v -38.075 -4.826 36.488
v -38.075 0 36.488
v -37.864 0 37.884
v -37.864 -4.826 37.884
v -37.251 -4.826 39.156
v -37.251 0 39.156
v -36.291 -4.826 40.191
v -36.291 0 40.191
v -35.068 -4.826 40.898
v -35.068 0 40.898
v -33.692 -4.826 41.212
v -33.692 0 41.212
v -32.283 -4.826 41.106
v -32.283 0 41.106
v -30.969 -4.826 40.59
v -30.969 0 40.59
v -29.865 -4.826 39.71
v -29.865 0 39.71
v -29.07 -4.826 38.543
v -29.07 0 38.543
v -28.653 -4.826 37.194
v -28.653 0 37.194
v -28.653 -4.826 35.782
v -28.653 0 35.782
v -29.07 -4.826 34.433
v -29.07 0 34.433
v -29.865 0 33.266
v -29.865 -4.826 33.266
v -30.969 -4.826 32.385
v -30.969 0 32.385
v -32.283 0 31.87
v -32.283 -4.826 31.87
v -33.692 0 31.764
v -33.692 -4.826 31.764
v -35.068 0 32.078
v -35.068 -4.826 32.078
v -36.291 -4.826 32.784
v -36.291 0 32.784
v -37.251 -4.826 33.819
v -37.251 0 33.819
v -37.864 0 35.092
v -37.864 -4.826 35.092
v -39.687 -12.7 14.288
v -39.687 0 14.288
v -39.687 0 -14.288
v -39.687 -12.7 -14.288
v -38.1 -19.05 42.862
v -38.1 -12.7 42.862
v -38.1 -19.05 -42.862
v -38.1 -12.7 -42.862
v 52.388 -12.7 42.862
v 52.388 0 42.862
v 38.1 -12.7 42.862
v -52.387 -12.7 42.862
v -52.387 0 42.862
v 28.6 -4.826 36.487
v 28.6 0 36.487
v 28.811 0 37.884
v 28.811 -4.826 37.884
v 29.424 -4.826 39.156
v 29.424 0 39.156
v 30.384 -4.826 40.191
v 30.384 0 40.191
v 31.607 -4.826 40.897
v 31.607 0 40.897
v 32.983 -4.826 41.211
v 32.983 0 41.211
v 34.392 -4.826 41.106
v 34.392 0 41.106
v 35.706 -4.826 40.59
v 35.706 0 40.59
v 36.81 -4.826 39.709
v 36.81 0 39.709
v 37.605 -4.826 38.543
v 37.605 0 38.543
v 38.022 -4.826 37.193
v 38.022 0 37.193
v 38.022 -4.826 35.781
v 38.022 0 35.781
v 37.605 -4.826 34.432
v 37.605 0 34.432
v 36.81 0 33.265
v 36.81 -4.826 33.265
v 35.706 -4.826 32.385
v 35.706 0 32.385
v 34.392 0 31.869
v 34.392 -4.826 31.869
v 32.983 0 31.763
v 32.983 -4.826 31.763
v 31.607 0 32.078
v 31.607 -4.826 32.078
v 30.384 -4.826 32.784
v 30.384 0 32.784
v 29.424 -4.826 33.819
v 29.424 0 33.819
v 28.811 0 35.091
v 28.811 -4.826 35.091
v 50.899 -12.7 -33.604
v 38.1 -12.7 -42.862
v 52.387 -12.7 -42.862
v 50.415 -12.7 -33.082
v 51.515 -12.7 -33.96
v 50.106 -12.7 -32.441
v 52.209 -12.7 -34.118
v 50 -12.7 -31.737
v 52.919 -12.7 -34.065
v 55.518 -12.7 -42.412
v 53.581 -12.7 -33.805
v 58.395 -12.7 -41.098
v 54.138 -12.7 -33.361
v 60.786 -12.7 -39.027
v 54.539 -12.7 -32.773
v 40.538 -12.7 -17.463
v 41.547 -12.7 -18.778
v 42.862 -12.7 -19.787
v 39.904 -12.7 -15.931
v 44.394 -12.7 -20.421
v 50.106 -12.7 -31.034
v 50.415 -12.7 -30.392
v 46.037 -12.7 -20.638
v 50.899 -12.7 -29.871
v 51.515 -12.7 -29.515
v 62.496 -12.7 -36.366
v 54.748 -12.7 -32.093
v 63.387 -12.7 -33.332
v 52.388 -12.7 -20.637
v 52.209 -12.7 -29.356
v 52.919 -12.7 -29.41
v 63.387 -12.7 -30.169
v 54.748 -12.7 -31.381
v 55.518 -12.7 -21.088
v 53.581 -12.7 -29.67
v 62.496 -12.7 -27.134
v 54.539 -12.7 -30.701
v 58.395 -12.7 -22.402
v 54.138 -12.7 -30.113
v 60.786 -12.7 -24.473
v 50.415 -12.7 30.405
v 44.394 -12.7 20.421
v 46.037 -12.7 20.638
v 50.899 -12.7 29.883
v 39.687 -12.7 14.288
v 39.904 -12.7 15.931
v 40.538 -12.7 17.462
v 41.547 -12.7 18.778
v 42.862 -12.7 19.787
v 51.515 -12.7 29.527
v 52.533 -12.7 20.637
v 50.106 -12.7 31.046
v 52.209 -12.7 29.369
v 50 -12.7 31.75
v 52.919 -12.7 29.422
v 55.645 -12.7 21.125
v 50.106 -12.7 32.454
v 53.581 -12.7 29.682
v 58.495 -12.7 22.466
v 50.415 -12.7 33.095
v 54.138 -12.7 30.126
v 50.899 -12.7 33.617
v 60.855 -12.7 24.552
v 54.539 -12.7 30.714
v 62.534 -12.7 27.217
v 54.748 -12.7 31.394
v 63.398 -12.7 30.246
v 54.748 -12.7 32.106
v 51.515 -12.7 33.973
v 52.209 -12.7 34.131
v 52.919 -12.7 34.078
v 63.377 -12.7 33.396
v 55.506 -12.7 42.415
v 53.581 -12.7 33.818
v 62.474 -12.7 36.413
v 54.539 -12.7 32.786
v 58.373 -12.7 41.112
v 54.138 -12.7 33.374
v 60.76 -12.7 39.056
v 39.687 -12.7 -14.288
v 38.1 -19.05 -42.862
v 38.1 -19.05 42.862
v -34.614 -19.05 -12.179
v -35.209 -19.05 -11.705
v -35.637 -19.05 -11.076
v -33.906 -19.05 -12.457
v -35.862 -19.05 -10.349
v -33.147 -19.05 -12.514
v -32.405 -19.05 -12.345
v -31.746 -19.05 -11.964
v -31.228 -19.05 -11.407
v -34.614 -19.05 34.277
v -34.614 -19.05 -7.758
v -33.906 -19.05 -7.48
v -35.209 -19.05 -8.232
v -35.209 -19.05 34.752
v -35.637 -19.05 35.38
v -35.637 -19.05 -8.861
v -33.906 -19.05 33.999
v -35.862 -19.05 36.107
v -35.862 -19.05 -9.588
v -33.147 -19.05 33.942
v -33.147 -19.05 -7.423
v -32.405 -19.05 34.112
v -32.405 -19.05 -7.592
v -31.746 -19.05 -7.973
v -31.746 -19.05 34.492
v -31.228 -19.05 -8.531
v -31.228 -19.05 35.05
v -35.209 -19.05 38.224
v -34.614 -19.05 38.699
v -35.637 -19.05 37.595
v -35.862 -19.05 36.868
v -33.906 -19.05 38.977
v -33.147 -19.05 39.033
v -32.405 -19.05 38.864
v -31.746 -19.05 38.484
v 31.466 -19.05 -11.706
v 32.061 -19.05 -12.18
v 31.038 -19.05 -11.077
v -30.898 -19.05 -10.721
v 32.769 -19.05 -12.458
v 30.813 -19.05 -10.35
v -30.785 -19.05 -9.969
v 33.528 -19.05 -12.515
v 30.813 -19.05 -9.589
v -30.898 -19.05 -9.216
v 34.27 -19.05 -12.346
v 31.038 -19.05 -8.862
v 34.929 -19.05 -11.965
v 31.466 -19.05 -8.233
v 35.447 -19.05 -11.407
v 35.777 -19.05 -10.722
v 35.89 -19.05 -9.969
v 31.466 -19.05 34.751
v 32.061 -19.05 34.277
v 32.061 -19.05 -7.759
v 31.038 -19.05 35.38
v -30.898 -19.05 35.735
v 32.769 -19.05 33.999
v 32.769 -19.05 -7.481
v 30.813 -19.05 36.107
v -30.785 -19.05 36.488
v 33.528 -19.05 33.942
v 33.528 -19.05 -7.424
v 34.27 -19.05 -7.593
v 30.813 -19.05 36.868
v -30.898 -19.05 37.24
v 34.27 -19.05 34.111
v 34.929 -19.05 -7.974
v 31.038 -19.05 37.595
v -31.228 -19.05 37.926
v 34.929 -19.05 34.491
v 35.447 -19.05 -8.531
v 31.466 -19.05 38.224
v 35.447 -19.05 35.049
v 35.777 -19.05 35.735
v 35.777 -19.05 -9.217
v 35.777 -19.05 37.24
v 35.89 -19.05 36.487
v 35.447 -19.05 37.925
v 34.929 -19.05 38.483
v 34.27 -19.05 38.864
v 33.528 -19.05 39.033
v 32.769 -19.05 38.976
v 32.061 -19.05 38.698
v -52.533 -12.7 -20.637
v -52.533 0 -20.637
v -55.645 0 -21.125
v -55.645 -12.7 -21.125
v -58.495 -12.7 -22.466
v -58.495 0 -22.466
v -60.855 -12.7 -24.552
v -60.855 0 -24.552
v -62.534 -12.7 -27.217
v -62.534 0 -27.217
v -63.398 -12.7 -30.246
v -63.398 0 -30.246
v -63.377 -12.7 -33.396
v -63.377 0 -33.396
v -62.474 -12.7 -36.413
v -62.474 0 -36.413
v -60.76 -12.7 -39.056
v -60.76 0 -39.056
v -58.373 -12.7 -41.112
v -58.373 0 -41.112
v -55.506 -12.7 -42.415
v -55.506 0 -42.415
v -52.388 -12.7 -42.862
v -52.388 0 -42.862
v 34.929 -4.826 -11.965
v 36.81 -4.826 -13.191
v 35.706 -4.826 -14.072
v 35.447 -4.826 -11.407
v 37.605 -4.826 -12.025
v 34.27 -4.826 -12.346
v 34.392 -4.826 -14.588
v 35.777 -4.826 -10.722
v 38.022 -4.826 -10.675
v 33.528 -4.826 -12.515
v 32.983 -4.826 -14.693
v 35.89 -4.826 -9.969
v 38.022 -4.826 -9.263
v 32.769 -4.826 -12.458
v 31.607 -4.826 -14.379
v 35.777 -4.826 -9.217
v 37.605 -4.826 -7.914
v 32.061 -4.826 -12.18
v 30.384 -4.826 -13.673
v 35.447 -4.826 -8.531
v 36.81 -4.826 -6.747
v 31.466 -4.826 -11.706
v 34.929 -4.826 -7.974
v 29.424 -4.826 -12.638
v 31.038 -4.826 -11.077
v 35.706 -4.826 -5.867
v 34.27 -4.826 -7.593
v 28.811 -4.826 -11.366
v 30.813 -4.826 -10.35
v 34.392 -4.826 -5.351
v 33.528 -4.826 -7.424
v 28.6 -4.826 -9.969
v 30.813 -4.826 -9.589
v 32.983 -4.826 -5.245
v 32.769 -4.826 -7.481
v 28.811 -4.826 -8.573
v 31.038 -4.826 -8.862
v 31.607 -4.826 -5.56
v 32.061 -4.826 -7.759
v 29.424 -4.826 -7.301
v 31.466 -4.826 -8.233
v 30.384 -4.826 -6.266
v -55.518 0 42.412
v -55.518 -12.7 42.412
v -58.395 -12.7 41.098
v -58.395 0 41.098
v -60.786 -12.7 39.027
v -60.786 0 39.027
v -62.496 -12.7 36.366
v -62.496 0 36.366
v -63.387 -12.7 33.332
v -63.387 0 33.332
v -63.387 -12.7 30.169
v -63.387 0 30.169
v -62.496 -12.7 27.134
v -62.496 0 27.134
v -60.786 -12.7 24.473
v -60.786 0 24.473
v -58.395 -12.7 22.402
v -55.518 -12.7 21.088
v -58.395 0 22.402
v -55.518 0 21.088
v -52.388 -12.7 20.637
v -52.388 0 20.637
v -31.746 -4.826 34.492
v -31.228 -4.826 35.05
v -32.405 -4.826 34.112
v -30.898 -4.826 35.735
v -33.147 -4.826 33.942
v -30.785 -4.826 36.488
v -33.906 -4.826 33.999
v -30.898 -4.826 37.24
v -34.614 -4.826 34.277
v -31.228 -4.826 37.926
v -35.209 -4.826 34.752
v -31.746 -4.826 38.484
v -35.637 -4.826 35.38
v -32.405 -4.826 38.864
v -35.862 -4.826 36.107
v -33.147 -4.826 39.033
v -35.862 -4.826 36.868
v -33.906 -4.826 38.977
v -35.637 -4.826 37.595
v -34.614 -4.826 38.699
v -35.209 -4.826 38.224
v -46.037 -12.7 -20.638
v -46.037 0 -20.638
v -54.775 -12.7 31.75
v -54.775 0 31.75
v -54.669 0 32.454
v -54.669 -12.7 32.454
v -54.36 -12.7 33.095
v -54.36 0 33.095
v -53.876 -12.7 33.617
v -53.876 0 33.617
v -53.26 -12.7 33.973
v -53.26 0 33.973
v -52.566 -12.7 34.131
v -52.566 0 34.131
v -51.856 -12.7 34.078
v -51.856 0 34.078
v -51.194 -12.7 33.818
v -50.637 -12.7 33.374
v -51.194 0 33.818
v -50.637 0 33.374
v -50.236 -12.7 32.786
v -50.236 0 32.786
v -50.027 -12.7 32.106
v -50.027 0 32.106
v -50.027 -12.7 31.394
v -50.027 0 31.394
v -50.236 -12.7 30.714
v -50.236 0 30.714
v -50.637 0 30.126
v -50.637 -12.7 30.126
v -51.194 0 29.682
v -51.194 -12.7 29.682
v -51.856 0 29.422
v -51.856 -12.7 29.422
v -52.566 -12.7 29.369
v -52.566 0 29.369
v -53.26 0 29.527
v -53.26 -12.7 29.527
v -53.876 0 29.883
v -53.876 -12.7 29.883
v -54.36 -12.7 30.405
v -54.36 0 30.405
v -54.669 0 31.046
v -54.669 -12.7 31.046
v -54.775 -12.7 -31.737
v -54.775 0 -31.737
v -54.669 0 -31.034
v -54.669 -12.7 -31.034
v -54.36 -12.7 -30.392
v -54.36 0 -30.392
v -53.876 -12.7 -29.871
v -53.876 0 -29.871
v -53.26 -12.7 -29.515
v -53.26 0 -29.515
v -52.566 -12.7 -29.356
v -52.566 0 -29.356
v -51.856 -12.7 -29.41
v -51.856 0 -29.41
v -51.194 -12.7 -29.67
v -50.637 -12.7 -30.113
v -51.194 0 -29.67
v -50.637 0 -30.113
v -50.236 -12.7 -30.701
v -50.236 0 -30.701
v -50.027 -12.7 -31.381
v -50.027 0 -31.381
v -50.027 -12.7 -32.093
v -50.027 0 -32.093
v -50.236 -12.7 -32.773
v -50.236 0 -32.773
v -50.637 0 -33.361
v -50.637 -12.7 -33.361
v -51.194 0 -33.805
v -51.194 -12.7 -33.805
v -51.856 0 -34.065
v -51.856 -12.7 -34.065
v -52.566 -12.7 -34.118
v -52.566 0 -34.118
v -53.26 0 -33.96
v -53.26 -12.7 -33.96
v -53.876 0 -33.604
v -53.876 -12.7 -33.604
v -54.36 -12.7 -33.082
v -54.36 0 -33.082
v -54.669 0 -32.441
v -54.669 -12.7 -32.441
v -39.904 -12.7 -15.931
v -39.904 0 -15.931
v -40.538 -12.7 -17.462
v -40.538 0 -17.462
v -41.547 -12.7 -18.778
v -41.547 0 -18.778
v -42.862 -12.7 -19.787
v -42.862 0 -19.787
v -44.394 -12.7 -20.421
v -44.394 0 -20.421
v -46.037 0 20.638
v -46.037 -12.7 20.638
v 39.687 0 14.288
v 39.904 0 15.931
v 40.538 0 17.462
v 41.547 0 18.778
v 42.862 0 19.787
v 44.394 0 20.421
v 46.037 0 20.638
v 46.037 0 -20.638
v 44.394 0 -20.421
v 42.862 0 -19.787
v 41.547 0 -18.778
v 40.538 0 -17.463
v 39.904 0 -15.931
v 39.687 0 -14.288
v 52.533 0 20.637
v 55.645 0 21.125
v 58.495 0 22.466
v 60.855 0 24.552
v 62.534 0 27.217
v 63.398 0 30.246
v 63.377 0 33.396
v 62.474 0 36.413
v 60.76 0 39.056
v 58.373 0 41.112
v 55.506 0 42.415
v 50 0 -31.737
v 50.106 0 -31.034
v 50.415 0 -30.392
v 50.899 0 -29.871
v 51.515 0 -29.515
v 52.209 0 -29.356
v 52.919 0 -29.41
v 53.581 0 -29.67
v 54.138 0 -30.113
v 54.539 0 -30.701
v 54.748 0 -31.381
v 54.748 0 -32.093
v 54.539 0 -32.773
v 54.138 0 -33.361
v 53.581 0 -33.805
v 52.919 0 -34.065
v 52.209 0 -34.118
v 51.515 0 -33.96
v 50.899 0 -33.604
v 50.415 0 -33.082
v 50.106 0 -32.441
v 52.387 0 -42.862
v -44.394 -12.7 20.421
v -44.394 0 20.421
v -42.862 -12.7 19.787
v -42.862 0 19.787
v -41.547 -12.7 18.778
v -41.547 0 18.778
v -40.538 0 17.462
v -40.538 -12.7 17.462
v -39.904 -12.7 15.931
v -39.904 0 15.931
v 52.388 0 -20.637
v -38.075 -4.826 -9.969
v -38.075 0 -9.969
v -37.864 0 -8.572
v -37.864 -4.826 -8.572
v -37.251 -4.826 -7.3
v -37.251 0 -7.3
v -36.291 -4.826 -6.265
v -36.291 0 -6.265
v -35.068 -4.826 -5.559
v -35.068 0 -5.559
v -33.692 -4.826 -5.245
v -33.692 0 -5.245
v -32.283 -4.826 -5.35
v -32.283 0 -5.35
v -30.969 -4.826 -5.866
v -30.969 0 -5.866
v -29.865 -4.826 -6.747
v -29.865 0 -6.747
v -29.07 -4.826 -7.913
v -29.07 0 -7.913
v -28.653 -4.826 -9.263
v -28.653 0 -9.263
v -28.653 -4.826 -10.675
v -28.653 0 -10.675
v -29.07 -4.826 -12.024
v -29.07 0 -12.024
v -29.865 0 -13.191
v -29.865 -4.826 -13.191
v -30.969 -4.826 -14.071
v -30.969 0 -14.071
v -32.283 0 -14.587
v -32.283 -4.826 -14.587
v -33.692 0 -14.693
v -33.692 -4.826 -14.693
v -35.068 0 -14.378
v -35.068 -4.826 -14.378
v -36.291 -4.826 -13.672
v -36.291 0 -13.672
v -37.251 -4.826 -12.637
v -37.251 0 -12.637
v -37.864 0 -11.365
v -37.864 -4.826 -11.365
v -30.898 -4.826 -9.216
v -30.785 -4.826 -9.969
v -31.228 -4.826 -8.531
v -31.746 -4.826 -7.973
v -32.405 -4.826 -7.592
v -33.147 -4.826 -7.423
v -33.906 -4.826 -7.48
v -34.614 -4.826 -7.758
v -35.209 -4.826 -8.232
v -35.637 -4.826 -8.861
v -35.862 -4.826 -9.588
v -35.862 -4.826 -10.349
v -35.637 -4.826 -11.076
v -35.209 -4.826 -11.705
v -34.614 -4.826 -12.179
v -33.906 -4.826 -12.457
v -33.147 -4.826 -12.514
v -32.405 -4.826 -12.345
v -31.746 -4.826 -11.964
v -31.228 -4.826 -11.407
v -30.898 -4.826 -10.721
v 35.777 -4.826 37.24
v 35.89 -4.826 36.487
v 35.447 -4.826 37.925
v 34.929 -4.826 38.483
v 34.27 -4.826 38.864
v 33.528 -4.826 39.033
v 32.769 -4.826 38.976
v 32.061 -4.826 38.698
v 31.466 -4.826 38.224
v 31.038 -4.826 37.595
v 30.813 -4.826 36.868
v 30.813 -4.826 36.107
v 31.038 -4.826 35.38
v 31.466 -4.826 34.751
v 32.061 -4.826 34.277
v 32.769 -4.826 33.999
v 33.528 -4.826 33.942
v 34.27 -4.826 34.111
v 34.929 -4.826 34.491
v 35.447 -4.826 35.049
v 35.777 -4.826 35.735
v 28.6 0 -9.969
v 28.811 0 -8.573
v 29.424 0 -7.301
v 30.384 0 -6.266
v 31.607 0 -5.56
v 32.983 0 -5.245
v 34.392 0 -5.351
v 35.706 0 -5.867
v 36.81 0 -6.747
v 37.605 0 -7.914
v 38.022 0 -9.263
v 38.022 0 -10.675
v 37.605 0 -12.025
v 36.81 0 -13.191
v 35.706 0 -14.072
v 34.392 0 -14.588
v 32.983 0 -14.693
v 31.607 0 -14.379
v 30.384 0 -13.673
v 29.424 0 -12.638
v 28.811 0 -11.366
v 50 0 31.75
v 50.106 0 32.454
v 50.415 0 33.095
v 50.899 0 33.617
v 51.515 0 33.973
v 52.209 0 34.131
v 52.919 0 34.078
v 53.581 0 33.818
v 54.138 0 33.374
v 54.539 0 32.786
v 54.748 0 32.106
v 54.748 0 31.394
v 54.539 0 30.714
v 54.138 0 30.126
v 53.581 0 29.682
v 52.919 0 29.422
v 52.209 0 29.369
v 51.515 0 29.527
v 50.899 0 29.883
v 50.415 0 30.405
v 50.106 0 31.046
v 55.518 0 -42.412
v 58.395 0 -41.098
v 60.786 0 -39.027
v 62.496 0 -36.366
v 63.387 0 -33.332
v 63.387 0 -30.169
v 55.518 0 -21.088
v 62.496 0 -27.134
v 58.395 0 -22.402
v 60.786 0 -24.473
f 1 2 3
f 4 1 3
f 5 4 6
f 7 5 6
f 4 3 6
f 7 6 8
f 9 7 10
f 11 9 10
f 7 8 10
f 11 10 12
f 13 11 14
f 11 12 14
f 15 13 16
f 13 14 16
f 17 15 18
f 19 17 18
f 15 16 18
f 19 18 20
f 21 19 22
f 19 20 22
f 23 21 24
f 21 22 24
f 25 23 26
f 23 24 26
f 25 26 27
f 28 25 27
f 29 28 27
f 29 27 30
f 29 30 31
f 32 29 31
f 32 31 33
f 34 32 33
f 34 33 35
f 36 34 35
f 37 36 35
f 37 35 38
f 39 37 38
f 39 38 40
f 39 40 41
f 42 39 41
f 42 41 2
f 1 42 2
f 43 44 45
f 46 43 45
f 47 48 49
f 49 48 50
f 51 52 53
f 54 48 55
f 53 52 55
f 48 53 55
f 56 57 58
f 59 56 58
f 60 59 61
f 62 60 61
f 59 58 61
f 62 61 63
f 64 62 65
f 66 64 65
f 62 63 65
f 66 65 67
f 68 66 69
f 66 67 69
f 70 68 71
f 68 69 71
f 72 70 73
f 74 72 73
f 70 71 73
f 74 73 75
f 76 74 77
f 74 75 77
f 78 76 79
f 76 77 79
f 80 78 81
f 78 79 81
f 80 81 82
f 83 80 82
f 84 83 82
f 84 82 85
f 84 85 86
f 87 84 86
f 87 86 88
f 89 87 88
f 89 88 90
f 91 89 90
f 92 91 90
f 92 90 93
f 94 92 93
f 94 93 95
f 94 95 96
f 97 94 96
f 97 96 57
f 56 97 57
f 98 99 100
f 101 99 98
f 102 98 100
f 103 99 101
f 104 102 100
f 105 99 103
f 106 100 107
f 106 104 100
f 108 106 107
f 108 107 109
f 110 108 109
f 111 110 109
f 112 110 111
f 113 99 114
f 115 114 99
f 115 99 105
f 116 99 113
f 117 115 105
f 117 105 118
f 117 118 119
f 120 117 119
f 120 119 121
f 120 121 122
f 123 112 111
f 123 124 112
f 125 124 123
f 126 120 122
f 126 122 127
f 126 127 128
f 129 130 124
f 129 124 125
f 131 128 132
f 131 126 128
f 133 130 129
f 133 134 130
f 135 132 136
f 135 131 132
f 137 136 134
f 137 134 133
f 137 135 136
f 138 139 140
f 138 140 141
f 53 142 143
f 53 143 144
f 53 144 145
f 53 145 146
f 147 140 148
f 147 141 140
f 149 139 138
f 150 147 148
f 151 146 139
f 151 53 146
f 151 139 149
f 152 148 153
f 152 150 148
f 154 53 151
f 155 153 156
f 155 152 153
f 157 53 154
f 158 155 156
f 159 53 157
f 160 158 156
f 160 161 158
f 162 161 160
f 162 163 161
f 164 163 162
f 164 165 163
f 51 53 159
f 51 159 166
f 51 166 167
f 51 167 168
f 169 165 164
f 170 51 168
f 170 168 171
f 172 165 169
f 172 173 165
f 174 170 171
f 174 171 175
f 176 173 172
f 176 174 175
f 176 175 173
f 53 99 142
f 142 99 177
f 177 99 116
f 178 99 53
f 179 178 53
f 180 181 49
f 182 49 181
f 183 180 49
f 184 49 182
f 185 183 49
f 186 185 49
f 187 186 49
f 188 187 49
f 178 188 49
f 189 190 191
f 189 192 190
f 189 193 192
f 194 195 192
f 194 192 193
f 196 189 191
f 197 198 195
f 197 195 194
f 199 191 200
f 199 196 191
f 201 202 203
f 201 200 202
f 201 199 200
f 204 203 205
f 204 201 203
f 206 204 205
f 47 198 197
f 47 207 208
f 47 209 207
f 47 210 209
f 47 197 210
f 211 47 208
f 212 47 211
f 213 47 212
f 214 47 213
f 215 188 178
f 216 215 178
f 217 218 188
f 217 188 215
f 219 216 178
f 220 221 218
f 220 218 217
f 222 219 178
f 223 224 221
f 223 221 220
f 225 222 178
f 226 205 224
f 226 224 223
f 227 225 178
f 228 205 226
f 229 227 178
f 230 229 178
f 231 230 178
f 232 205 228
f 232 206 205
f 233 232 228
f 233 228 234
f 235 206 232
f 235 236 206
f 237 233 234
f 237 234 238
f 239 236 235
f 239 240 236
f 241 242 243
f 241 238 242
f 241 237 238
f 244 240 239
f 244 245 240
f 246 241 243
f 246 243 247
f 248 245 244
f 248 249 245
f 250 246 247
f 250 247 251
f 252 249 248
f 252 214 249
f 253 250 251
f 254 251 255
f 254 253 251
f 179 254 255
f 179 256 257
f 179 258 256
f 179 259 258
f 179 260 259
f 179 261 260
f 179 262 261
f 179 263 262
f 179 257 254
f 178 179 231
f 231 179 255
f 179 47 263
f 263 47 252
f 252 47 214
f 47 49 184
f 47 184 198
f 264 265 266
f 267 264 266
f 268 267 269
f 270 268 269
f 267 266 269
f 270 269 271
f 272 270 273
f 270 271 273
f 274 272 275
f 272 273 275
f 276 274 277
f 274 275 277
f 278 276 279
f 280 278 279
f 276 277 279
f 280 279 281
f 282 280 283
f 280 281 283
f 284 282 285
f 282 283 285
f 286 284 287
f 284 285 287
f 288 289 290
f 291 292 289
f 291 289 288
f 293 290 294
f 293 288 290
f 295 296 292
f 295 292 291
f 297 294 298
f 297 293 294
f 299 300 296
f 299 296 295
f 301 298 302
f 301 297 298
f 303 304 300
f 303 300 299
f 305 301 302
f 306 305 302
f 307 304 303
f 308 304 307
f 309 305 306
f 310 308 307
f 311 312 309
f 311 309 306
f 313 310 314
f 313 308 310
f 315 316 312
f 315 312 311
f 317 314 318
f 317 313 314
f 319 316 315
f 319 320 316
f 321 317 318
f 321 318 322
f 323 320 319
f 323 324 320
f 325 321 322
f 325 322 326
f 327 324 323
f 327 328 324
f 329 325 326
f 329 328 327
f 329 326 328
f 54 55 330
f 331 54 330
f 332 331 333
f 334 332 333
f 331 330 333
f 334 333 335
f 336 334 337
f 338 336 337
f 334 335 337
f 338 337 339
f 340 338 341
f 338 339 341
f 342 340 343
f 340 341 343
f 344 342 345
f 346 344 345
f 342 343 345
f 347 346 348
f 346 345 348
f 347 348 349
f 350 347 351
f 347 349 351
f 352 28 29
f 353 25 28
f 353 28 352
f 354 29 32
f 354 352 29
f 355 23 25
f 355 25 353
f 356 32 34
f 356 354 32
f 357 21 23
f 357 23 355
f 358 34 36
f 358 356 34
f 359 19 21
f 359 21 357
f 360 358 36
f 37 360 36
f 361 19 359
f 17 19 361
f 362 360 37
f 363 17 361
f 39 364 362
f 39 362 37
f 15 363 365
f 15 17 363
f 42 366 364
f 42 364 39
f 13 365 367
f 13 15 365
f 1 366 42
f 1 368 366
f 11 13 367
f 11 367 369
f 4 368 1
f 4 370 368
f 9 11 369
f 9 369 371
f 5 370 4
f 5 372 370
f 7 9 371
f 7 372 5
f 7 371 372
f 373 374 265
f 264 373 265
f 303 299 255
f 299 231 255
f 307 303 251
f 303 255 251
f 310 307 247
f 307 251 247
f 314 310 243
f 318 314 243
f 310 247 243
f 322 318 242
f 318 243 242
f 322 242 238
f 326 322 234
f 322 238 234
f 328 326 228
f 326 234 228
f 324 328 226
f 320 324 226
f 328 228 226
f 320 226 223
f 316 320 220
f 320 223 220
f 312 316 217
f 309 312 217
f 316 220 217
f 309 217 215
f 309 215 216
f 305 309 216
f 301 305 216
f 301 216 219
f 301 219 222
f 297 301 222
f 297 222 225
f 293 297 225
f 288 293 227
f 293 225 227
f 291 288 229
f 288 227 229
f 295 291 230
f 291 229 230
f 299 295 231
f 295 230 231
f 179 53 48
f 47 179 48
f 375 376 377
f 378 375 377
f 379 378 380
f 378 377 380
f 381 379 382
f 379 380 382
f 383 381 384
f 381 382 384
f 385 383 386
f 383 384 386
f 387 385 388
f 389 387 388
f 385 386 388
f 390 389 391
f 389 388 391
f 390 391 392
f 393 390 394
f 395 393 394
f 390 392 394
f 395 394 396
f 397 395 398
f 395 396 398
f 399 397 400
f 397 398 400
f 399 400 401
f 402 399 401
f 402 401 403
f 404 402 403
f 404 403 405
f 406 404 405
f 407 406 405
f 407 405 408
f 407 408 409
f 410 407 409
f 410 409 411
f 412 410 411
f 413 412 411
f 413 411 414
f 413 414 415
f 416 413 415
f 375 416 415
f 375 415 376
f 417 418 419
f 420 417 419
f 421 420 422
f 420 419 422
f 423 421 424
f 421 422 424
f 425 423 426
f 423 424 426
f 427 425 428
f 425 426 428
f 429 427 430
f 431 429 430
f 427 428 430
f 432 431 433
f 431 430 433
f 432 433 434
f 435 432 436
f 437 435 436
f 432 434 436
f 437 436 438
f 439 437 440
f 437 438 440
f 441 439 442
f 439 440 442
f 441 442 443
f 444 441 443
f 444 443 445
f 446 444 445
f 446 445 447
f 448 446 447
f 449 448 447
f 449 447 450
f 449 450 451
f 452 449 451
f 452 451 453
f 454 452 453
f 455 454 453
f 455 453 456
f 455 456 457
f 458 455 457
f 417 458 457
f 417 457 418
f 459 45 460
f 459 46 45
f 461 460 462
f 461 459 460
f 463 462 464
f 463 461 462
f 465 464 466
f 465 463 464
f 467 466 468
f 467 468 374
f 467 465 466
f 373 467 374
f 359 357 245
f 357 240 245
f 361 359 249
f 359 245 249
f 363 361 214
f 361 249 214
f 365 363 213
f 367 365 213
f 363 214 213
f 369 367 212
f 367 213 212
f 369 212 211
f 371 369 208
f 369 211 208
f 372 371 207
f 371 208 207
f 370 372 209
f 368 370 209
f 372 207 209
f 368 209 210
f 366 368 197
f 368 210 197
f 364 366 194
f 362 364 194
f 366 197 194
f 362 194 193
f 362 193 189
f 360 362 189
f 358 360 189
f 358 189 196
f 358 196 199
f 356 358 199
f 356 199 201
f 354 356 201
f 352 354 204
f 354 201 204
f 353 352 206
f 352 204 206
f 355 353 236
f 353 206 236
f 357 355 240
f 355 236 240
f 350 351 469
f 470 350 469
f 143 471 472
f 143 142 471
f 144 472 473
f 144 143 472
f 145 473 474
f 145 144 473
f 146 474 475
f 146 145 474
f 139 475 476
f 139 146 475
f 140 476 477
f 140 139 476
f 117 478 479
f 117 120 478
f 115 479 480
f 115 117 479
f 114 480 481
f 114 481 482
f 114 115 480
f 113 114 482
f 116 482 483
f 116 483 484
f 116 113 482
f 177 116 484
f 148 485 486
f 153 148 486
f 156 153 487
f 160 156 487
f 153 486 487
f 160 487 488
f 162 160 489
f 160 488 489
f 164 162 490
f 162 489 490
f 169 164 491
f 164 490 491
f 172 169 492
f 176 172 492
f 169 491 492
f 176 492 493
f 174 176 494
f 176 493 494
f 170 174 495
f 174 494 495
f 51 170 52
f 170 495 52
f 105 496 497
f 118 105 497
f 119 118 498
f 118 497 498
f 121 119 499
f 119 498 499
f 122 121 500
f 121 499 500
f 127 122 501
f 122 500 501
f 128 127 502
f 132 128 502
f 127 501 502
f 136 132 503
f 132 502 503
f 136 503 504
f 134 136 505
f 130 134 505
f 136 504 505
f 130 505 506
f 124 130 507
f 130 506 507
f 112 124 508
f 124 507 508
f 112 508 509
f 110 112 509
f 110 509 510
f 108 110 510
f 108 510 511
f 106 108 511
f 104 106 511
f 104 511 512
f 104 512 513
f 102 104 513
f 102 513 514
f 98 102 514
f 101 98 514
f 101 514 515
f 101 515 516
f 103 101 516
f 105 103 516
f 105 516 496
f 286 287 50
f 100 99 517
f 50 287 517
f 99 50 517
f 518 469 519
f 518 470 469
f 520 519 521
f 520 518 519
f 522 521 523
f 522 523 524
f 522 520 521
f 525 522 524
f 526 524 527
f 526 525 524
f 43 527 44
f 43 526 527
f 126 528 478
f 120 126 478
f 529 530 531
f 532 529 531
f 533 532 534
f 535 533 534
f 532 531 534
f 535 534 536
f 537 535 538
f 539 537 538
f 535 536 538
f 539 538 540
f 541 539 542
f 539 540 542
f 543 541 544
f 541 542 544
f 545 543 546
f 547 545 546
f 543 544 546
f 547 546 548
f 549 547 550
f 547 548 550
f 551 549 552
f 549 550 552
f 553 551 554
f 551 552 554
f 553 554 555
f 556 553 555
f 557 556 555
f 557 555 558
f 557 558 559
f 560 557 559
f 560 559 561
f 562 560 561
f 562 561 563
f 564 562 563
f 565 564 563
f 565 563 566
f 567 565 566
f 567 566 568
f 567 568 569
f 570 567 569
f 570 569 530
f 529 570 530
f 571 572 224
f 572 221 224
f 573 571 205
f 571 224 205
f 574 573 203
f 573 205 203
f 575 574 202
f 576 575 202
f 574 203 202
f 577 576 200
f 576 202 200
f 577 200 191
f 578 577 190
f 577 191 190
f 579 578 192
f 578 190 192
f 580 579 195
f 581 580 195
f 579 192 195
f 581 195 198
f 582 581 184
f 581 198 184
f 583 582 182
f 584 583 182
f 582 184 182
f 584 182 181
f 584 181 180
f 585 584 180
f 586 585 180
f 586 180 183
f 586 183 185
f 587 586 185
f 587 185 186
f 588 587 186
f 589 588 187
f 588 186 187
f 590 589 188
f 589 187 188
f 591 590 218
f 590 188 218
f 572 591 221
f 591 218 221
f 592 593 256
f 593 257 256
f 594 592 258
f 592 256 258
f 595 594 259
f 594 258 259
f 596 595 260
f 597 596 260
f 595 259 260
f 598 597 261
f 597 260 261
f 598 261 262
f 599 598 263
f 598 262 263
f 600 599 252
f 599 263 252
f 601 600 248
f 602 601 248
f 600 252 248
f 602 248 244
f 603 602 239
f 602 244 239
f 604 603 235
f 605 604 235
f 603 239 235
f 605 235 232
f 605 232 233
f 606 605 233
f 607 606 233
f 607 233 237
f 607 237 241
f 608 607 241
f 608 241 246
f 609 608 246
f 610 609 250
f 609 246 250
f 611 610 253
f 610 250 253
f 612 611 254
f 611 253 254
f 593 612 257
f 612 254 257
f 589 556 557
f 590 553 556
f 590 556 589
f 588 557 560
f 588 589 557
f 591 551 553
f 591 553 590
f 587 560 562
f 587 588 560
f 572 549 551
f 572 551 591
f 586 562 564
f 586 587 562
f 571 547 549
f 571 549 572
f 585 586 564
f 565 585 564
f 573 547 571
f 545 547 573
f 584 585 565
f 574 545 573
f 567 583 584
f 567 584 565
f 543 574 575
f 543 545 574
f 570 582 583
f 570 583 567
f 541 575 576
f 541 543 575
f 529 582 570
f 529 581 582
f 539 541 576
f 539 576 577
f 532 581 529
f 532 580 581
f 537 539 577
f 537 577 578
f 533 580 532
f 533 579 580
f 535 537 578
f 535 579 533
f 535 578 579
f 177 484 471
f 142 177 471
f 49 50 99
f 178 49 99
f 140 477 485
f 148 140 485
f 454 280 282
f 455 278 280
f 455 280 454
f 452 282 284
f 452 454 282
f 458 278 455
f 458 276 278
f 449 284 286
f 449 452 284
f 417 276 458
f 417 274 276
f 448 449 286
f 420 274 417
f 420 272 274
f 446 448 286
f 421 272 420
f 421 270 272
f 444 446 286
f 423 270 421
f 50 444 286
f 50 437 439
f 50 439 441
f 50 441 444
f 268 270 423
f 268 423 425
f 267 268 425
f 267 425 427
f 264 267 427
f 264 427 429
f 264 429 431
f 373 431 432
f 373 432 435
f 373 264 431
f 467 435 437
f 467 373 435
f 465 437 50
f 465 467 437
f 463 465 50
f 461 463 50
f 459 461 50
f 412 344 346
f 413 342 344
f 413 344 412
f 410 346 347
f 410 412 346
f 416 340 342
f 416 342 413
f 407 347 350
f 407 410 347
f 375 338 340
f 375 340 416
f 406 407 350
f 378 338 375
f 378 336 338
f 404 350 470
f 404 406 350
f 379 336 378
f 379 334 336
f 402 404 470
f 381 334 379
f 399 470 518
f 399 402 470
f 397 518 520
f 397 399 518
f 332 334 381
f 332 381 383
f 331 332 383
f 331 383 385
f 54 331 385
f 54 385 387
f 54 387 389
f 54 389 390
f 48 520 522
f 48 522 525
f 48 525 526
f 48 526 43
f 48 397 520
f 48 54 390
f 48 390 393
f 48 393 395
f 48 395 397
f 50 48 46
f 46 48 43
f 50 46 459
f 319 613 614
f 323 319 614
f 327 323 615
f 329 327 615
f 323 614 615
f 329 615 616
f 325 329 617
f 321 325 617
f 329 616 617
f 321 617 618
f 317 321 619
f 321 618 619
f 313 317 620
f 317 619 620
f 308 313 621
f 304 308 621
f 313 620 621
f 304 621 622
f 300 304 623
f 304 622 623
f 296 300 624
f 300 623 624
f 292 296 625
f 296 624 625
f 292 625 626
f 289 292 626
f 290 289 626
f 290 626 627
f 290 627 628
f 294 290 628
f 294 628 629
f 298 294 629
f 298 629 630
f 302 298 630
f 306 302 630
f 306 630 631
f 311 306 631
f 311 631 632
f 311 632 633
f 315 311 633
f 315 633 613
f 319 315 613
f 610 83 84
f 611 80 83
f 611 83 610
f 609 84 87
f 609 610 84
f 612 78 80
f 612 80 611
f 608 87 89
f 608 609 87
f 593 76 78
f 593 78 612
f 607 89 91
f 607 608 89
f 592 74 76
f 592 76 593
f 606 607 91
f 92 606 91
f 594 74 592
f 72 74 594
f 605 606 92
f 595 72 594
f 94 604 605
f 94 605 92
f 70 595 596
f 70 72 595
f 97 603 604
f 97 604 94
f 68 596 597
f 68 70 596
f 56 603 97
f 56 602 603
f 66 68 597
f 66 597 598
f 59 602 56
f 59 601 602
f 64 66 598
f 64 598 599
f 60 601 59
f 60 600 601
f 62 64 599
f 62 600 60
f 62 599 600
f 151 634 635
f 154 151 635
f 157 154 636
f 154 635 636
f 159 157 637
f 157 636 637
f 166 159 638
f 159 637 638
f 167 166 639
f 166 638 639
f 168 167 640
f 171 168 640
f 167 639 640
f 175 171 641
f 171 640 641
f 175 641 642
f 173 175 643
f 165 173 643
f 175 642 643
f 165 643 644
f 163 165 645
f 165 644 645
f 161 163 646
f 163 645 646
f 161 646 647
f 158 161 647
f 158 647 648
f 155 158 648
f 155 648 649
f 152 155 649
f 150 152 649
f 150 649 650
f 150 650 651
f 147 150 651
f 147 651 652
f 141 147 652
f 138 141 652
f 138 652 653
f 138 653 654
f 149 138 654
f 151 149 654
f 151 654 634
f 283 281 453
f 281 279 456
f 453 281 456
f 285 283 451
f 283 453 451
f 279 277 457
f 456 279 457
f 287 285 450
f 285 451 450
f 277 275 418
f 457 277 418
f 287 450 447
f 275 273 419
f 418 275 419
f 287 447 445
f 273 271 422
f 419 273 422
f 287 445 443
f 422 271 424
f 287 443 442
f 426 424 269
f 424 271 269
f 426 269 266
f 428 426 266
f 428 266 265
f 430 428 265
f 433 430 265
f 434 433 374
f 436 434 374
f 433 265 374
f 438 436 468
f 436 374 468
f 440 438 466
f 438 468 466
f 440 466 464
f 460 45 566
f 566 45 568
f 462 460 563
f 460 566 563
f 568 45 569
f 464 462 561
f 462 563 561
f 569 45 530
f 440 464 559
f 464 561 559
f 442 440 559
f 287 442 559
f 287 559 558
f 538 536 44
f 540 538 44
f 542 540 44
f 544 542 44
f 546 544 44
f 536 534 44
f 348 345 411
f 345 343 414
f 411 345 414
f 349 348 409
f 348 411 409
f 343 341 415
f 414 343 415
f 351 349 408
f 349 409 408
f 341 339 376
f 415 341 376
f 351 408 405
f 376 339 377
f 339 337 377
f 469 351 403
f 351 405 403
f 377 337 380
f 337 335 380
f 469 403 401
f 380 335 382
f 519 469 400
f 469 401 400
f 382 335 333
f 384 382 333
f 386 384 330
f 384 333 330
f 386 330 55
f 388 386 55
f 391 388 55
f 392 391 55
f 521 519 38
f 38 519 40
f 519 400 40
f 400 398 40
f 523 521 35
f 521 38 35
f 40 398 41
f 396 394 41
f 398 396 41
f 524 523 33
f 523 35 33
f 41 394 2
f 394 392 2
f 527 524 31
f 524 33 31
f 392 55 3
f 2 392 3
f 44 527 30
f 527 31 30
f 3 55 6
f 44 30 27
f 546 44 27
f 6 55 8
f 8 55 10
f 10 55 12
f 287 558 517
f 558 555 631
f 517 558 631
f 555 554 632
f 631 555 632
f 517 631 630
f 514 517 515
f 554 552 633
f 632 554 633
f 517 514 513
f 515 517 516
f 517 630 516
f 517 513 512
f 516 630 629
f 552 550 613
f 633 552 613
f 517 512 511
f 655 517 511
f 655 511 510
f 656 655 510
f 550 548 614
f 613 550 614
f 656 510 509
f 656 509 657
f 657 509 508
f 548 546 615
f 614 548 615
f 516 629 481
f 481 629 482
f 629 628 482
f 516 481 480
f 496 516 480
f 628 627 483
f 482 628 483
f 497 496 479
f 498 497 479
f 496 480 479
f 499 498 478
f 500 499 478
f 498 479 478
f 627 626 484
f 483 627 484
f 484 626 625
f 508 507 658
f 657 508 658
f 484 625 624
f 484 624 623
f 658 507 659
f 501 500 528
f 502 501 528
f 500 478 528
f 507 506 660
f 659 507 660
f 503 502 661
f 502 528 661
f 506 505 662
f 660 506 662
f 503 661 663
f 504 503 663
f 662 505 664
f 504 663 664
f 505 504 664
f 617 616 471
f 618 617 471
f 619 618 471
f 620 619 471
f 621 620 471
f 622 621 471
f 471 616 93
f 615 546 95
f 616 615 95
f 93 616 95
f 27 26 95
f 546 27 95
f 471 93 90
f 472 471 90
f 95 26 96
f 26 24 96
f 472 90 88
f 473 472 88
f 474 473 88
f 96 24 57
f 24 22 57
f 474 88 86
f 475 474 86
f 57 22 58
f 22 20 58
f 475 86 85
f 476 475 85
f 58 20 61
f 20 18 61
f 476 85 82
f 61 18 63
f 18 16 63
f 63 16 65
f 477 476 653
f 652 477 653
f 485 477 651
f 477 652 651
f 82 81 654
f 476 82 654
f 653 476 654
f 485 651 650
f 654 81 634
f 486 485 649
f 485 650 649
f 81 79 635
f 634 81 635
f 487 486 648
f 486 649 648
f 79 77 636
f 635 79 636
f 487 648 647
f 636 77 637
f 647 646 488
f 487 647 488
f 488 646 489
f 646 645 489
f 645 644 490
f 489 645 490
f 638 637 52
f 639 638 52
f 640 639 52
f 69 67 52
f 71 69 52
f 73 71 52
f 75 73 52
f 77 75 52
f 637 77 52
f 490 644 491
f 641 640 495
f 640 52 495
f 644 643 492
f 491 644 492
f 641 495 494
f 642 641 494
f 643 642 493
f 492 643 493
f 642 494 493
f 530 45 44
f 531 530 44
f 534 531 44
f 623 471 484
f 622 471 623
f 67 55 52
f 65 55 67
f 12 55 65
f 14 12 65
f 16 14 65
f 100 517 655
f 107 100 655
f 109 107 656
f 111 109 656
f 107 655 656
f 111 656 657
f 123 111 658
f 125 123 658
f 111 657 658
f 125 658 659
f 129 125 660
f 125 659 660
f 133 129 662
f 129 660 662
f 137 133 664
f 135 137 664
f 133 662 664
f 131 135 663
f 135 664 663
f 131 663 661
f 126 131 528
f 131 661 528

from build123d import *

# Parameters (mm, degrees)
F1_DEPTH       = 12.7
F2_R           = 6.35
F4_DEPTH       = 6.35
F6_D           = 4.7752
F8_D           = 5.1054
F8_CBORE_D     = 9.4742
F8_CBORE_DEPTH = 4.826


with BuildPart() as f1:
    # F0 (on Front) → F1 (new body)
    with BuildSketch(Plane.XZ):
        with BuildLine():
            Line((52.387601, 42.861543), (-52.387399, 42.8625))
            ThreePointArc((-52.387399, 42.8625), (-63.5, 31.750051), (-52.3875, 20.6375))
            Line((-52.3875, 20.6375), (-39.6875, 20.6375))
            Line((-39.6875, 20.6375), (-39.6875, -20.6375))
            Line((-39.6875, -20.6375), (-52.533336, -20.6375))
            ThreePointArc((-52.533336, -20.6375), (-63.499761, -31.821912), (-52.387601, -42.861543))
            Line((-52.387601, -42.861543), (52.387399, -42.8625))
            ThreePointArc((52.387399, -42.8625), (63.5, -31.750051), (52.3875, -20.6375))
            Line((52.3875, -20.6375), (39.6875, -20.6375))
            Line((39.6875, -20.6375), (39.6875, 20.6375))
            Line((39.6875, 20.6375), (52.533336, 20.6375))
            ThreePointArc((52.533336, 20.6375), (63.499761, 31.821912), (52.387601, 42.861543))
        make_face()
    extrude(amount=F1_DEPTH)

    # F2
    f2_edges = [f1.edges().sort_by_distance(p)[0] for p in [
        (-39.6875, -6.35, 20.6375),
        (-39.6875, -6.35, -20.6375),
        (39.6875, -6.35, 20.6375),
        (39.6875, -6.35, -20.6375),
    ]]
    fillet(f2_edges, radius=F2_R)

    # F3 (on face) → F4 (join)
    with BuildSketch(Plane.XZ.offset(12.7)):
        Polygon((-38.1, -42.861674), (38.1, -42.86237), (38.1, 42.861674), (-38.1, 42.86237), align=None)
        Polygon((-38.1, 42.86237), (38.1, 42.861674), (38.1, 42.8625), (-38.1, 42.8625), align=None)
    extrude(amount=F4_DEPTH)

    # F6 (through all)
    with Locations(Plane.XZ.offset(12.7)):
        with Locations((-52.3875, 31.75), (52.3875, 31.75), (52.3875, -31.7373), (-52.3875, -31.7373)):
            Hole(F6_D / 2)

    # F8 (through all)
    with Locations(Plane(origin=(0, 0, 0), x_dir=(-1, 0, 0), z_dir=(0, 1, 0))):
        with Locations((-33.3375, 36.487274), (33.3375, 36.487883), (33.3375, -9.968717), (-33.3375, -9.969326)):
            CounterBoreHole(F8_D / 2, F8_CBORE_D / 2, F8_CBORE_DEPTH)


solid = f1.part
